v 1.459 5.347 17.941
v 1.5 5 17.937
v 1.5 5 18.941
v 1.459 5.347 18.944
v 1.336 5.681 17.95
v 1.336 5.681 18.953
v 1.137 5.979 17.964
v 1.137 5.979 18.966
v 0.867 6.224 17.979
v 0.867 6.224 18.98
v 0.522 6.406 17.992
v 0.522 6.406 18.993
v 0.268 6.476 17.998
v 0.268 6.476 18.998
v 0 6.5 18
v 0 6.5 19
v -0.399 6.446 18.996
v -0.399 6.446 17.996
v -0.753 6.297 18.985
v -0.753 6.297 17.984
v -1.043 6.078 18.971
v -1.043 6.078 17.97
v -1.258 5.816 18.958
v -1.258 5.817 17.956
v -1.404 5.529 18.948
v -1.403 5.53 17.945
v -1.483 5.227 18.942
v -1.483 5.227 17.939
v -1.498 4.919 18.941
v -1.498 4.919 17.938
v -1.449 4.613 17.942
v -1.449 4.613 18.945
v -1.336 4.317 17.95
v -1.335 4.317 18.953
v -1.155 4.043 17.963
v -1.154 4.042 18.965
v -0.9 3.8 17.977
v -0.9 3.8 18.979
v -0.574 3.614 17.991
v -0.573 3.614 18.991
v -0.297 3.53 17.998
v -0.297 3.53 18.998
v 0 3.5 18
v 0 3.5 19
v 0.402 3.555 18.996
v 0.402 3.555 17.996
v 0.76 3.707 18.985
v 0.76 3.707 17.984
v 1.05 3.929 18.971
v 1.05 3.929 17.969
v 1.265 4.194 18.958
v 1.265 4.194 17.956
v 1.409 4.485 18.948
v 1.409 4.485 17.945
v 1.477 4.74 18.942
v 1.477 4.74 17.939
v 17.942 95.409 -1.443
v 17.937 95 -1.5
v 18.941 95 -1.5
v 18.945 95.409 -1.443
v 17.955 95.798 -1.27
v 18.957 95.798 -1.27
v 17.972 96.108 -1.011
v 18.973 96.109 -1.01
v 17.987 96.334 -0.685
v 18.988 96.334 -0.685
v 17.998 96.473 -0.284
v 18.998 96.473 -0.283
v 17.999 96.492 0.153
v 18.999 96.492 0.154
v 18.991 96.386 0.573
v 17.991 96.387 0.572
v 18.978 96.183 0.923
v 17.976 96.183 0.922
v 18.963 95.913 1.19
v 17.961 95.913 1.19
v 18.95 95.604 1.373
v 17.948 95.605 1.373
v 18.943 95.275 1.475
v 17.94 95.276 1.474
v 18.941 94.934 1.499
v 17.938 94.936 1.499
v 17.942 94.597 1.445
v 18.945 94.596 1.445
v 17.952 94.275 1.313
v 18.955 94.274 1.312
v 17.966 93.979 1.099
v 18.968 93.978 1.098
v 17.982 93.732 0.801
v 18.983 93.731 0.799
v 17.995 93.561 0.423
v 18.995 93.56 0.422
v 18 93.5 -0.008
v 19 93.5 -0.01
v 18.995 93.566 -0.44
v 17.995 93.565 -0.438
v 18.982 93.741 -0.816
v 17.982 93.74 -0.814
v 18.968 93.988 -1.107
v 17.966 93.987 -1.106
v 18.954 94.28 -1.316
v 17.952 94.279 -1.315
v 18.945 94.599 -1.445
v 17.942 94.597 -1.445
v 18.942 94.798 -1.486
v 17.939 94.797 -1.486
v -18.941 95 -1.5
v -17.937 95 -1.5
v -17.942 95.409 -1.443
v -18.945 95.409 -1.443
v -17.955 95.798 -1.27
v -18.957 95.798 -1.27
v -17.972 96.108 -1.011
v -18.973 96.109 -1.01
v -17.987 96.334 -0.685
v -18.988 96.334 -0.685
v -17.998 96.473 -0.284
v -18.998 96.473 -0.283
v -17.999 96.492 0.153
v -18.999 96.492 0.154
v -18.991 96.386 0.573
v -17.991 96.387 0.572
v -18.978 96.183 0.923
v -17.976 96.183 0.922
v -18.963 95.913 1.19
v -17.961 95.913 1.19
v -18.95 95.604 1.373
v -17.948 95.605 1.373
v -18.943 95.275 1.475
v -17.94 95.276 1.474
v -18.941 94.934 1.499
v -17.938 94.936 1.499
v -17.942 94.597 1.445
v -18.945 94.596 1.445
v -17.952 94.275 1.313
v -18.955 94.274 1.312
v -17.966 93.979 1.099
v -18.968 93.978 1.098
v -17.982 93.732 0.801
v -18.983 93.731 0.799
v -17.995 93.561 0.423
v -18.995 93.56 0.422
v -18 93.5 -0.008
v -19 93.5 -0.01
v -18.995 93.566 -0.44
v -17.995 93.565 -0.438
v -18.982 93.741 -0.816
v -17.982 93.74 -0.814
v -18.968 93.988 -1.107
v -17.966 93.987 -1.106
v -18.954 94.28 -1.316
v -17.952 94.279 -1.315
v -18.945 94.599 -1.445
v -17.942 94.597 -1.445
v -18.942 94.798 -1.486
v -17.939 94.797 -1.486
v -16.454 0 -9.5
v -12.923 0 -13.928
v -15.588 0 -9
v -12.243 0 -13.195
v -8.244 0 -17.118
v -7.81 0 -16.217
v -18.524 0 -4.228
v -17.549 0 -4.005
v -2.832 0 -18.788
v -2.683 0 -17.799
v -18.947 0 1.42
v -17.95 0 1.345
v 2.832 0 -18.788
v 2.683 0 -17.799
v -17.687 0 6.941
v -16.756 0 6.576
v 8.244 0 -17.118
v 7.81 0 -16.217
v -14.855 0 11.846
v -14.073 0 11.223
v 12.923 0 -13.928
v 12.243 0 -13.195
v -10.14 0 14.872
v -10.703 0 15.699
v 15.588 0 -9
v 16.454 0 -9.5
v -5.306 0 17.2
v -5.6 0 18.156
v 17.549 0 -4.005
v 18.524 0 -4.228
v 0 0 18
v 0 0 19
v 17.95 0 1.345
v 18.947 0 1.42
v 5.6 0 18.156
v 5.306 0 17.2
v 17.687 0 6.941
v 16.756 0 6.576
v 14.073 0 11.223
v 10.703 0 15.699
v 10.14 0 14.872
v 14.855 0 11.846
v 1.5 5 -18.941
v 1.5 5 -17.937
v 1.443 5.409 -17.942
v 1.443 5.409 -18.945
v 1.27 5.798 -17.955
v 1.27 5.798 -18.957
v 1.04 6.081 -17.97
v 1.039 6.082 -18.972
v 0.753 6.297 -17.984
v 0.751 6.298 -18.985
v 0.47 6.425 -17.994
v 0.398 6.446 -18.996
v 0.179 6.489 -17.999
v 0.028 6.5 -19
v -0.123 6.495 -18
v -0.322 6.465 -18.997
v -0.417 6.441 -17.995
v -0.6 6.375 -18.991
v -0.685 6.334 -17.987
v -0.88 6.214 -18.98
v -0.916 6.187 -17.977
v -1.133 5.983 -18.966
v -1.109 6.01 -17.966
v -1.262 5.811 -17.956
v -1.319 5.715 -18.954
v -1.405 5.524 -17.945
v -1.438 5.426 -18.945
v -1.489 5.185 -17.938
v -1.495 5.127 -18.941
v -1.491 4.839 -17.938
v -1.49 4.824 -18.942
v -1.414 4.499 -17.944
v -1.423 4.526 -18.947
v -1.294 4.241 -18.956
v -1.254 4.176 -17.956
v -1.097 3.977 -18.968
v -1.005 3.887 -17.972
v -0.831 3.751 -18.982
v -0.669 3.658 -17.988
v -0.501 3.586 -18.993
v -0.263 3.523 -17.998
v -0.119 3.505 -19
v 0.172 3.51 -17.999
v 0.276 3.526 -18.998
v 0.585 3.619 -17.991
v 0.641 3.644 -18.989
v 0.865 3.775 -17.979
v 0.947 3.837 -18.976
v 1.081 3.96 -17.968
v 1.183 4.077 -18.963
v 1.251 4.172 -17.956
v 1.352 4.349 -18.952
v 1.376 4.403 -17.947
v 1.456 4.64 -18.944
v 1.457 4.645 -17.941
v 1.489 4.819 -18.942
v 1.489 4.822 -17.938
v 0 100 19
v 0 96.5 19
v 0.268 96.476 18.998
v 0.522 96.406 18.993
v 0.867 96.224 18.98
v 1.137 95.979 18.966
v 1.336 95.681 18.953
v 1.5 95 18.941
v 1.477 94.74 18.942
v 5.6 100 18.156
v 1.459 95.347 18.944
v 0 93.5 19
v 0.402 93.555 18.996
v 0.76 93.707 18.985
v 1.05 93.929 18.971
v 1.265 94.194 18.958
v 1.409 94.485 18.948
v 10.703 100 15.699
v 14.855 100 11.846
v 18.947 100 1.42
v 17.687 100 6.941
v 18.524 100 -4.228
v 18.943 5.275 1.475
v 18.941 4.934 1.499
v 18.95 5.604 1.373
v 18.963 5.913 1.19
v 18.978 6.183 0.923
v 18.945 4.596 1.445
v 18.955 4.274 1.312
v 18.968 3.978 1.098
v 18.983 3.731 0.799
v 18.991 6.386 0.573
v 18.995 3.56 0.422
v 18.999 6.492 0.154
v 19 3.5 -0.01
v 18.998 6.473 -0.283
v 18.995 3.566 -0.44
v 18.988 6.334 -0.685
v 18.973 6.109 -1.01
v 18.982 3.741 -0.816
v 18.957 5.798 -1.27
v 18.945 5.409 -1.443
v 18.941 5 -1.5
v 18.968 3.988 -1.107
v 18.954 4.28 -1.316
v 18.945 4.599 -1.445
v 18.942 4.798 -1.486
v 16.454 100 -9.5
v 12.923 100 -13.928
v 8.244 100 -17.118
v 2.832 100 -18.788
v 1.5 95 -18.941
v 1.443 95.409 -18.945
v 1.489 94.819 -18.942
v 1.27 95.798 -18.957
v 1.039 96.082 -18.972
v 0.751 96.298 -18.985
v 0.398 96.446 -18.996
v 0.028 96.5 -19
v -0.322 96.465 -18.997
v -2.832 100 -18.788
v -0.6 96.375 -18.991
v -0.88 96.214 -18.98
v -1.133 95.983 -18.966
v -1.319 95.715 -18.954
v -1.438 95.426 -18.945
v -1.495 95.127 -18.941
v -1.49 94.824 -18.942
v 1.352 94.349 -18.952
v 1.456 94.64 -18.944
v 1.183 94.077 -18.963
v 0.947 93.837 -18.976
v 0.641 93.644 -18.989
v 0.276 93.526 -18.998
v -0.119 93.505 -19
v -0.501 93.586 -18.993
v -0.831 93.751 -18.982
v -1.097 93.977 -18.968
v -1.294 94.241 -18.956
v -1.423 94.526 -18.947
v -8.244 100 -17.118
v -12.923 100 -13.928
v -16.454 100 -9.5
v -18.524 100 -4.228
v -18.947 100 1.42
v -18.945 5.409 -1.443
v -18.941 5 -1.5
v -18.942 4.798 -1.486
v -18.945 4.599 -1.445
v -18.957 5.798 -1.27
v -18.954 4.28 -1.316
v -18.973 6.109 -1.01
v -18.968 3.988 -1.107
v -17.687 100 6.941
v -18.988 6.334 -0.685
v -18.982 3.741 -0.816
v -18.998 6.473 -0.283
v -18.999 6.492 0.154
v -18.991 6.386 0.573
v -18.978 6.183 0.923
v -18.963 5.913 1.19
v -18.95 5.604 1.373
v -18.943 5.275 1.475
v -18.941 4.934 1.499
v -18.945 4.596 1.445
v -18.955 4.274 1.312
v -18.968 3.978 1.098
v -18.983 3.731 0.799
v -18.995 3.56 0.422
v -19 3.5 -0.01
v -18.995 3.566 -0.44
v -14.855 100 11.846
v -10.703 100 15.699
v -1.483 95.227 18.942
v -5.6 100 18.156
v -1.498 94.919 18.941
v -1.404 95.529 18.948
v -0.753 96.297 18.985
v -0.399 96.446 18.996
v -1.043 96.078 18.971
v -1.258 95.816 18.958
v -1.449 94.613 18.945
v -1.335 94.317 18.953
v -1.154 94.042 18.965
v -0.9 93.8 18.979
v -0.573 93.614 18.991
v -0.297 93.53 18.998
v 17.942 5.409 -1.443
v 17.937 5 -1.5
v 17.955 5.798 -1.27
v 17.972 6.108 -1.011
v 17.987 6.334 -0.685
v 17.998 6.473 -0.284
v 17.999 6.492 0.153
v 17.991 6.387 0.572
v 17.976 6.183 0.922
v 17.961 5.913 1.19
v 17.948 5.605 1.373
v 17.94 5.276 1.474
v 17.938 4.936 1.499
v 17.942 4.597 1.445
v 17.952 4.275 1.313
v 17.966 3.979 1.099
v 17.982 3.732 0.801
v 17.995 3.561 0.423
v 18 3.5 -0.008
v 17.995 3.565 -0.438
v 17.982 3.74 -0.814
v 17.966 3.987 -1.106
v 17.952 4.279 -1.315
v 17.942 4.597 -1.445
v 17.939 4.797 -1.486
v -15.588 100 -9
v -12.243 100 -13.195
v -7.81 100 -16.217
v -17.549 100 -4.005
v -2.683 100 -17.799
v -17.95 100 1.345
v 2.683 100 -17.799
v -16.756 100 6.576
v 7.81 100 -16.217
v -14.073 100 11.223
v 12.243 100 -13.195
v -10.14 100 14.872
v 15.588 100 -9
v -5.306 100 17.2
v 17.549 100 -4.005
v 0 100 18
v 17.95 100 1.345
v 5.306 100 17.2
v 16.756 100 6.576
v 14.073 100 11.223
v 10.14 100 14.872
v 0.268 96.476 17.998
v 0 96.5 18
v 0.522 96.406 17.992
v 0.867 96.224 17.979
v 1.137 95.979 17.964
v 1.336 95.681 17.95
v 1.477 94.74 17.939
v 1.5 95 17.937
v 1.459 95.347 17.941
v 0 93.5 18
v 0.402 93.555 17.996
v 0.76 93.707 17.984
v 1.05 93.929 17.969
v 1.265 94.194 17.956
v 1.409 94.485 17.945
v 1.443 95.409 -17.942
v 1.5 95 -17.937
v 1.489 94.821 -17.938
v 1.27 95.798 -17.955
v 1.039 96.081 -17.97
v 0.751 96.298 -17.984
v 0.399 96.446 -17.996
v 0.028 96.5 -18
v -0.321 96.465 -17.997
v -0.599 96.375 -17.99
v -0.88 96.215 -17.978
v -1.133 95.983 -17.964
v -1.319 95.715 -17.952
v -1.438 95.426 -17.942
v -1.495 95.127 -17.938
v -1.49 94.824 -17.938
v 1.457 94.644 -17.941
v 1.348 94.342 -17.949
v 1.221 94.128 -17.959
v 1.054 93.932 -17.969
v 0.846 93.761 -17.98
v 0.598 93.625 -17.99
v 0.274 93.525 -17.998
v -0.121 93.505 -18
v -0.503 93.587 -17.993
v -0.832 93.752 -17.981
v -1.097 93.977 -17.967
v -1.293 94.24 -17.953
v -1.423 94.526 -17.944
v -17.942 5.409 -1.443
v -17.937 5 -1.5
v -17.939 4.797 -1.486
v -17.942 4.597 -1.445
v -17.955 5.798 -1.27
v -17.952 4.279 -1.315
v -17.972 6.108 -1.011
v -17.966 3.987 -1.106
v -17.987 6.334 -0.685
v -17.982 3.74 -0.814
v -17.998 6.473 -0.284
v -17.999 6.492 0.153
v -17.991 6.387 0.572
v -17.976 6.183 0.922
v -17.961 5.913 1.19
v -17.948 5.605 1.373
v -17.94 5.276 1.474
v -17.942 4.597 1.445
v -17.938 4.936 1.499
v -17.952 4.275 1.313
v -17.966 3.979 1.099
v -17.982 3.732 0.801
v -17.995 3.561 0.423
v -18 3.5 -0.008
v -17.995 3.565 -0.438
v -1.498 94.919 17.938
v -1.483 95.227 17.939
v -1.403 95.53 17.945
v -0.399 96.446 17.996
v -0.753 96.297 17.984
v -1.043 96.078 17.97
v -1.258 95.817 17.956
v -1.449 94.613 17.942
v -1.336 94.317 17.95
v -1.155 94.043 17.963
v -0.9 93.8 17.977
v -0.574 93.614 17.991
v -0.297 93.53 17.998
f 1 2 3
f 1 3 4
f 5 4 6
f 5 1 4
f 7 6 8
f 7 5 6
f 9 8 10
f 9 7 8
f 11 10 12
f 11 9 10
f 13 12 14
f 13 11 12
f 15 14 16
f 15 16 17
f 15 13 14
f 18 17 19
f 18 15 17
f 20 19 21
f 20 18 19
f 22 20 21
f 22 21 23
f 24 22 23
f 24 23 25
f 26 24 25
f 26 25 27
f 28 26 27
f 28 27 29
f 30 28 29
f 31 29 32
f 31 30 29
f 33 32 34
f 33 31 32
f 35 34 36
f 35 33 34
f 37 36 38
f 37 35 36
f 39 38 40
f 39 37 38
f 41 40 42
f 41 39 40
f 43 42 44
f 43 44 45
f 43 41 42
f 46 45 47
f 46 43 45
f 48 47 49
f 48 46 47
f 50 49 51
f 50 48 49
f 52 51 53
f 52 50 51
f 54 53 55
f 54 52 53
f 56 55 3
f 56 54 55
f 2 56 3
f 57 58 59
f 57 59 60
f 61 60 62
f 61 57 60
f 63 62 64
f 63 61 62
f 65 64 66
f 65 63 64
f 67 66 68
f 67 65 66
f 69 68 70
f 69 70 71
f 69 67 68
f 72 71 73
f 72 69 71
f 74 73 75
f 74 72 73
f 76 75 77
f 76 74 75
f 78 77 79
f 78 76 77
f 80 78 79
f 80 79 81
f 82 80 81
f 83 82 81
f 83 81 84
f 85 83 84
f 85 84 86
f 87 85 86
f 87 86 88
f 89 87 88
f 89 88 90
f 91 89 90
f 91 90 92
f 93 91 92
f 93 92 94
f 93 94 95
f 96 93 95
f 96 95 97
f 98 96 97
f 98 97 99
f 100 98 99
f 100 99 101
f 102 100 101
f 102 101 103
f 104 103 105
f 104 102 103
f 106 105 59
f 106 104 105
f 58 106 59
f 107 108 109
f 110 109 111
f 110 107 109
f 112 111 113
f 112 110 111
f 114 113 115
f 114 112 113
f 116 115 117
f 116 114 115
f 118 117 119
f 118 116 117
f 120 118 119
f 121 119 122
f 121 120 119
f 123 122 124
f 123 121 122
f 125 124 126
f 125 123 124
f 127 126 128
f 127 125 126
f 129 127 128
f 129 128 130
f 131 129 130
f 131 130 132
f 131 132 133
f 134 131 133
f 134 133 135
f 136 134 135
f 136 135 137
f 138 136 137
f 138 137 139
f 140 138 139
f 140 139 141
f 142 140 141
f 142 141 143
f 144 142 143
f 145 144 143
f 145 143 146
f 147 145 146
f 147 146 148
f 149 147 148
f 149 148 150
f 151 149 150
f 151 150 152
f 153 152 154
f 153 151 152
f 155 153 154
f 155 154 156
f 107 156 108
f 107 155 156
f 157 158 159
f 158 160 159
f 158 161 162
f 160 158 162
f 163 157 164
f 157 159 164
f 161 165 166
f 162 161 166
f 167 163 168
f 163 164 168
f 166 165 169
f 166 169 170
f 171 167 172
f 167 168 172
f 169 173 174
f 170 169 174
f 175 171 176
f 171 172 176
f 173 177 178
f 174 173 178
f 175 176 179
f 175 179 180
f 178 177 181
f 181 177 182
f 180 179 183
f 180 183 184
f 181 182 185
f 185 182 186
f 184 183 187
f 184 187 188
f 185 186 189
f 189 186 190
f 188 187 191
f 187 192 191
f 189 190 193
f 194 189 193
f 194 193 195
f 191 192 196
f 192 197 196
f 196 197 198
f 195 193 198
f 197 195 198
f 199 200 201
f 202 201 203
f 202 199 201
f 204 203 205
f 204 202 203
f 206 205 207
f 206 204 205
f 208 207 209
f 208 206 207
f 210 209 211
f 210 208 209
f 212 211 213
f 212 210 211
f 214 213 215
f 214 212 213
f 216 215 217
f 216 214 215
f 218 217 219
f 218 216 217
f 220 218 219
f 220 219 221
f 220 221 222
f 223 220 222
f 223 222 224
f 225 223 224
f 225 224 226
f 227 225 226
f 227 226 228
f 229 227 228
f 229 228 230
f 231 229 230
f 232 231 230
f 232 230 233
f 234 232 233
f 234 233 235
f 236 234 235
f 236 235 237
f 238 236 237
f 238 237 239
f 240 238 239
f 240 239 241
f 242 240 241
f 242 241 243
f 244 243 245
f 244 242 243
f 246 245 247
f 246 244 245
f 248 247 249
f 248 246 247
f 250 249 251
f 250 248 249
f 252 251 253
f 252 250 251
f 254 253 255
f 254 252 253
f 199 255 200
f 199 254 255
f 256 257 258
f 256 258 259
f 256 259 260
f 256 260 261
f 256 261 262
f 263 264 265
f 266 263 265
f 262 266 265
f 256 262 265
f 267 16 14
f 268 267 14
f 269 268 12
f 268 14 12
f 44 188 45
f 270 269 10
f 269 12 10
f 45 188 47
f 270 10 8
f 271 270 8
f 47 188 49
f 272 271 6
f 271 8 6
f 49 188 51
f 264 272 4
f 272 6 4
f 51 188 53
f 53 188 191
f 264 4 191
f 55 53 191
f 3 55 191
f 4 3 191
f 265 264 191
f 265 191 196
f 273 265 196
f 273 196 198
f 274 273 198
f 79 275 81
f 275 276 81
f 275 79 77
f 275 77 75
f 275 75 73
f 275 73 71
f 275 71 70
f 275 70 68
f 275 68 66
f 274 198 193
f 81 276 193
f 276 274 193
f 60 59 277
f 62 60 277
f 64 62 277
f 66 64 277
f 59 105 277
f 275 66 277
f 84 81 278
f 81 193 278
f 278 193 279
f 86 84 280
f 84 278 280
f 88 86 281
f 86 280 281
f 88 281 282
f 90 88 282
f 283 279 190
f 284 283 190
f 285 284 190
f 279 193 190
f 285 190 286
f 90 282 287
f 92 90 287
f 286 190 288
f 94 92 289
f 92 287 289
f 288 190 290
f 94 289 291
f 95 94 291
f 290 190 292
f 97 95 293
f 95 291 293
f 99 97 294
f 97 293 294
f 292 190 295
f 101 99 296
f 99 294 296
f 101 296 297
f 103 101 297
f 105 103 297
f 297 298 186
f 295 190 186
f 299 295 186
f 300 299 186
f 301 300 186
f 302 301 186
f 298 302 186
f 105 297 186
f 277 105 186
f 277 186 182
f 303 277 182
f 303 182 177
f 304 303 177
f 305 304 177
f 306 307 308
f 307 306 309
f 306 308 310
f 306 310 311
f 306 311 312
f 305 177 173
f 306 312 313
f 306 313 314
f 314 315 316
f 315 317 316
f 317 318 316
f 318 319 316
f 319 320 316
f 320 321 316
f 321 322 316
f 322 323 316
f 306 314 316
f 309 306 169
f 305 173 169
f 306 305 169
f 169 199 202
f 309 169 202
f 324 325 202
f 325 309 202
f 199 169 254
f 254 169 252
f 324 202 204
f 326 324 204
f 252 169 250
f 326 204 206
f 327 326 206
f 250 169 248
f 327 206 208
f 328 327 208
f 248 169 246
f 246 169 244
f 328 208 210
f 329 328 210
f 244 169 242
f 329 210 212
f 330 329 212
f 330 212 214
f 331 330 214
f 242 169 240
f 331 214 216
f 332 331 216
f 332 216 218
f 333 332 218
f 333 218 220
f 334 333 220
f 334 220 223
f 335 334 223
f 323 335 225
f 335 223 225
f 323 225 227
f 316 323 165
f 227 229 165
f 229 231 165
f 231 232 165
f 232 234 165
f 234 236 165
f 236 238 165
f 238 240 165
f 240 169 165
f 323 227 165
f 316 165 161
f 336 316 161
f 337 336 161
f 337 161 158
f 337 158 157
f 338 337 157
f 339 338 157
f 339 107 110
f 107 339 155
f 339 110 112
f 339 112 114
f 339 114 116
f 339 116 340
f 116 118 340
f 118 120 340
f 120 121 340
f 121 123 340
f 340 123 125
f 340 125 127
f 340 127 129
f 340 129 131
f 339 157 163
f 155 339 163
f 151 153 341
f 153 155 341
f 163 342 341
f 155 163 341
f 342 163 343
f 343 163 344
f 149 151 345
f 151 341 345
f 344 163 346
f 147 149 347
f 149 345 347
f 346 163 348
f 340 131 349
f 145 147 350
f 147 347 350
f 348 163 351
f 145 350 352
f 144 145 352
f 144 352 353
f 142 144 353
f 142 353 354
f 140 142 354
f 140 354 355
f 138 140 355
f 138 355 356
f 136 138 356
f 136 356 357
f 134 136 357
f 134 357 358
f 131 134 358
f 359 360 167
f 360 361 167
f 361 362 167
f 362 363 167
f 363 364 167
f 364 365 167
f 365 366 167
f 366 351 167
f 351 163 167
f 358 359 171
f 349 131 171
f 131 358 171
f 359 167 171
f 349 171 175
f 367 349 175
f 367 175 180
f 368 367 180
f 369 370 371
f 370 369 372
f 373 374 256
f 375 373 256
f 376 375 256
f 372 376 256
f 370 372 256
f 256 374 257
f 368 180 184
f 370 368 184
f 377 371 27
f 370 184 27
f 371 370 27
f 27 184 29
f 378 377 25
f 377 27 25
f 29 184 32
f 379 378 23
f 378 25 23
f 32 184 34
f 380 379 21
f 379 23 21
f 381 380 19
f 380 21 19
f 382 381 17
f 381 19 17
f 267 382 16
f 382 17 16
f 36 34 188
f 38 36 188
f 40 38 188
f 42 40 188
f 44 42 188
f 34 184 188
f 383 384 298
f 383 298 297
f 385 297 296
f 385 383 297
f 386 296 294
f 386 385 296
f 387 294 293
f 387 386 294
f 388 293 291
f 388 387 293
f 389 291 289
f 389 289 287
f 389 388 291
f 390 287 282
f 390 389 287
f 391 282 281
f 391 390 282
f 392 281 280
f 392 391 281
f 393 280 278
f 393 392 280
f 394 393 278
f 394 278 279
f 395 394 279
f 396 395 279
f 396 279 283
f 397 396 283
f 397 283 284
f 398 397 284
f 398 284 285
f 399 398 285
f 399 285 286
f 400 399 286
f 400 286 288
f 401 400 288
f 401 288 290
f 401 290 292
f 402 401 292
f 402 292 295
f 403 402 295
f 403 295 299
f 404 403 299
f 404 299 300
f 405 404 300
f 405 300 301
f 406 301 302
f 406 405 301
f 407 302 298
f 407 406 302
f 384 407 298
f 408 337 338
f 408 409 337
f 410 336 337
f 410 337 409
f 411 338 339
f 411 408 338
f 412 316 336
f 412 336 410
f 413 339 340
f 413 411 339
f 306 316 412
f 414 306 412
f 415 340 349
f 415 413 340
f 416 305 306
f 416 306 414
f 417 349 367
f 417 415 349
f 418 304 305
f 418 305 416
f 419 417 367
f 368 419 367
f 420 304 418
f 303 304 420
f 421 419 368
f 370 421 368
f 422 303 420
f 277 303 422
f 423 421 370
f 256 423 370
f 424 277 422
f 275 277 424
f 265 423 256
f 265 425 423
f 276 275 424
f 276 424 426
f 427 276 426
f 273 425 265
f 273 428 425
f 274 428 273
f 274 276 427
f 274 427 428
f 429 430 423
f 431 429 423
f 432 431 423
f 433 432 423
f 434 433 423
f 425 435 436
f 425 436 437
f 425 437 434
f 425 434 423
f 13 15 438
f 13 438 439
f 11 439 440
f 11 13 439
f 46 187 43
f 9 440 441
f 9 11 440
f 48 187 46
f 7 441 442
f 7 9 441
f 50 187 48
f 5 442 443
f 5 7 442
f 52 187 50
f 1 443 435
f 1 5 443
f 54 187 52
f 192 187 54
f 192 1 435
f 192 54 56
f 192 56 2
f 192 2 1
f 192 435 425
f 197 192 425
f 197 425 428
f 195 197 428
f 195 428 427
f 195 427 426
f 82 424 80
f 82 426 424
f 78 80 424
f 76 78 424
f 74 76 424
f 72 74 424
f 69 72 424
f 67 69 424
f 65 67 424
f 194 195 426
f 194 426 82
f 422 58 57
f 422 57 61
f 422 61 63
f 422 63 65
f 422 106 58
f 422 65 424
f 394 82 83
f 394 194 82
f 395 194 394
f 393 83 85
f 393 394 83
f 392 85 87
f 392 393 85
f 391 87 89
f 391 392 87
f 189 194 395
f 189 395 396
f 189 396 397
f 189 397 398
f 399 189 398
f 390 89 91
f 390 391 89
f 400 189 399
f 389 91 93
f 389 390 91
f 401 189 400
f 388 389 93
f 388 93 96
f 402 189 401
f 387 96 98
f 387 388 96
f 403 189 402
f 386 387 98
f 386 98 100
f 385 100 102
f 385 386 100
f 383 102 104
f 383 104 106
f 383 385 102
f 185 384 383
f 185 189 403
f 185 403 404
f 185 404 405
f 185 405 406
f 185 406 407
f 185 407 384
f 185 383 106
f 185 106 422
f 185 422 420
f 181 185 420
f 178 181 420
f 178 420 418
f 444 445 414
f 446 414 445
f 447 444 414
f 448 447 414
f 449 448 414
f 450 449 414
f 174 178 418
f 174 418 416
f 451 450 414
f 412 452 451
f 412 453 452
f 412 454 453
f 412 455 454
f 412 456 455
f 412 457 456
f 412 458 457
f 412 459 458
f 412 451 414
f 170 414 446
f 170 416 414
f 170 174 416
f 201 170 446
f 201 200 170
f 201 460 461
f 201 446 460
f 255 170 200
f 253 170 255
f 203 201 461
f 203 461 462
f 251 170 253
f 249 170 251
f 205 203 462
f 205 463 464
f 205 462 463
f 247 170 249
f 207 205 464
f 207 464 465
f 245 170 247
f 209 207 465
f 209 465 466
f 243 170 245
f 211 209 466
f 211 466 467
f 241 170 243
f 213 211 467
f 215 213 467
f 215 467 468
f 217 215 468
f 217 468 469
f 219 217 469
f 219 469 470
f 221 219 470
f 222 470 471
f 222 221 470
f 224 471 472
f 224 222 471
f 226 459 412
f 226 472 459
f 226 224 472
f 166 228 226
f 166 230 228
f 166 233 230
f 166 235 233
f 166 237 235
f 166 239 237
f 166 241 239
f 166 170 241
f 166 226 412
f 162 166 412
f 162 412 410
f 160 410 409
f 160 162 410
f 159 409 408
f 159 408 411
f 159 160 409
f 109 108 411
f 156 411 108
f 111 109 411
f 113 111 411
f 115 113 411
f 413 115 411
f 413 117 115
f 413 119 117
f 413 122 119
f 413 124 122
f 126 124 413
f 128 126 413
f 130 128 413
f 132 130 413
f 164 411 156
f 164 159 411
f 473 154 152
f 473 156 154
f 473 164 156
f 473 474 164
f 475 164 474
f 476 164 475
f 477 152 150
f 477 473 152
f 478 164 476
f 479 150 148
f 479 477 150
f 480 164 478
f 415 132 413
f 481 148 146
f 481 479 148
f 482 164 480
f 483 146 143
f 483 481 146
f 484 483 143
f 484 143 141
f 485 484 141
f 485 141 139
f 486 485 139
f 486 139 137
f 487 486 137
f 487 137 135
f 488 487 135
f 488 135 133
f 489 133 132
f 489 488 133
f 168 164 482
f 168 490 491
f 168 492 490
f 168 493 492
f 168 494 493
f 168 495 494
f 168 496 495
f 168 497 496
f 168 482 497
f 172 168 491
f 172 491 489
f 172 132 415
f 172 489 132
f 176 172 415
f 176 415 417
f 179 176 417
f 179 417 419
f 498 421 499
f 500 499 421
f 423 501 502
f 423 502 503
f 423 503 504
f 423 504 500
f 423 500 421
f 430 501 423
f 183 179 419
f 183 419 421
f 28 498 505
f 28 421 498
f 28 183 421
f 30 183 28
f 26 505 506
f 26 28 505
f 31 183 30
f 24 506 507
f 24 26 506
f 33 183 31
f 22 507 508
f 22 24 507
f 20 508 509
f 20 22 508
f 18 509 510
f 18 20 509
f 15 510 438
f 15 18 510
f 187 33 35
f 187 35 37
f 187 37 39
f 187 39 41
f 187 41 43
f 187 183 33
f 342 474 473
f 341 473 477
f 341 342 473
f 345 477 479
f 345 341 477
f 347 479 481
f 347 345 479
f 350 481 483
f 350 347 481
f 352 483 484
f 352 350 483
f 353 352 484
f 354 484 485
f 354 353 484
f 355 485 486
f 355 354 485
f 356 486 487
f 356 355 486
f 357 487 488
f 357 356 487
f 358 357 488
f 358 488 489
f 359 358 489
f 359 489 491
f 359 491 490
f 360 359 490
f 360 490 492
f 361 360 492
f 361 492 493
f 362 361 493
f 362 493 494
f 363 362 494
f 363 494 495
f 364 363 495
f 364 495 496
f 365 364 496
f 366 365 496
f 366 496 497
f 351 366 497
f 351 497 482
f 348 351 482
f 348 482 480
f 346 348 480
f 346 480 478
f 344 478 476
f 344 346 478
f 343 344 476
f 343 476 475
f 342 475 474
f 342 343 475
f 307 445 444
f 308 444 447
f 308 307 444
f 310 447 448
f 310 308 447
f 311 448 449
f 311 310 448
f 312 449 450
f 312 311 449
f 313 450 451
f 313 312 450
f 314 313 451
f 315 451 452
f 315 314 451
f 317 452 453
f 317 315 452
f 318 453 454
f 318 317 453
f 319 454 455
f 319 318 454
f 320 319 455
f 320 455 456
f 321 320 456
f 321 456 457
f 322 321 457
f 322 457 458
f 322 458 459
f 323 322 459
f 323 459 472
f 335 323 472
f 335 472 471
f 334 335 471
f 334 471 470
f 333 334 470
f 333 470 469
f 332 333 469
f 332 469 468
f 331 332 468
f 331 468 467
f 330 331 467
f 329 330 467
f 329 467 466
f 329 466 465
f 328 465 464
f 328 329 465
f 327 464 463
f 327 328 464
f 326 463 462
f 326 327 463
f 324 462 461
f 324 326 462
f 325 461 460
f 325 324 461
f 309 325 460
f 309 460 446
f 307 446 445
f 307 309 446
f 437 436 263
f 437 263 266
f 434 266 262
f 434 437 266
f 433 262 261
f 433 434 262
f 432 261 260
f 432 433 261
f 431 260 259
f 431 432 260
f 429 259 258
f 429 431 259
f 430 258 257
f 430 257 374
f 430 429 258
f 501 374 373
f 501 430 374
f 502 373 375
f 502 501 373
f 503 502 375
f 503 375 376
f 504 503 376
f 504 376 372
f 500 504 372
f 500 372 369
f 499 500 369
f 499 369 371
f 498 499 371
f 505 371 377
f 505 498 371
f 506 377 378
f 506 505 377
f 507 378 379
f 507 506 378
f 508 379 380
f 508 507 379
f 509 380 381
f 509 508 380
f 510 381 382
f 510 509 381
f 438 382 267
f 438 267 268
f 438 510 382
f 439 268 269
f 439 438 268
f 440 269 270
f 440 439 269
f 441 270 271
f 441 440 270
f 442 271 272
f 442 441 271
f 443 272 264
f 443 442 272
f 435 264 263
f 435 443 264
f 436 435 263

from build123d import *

# Parameters (mm, degrees)
SKETCH1_R               = 19
SKETCH1_R_2             = 18
BOSS_EXTRUDE1_DEPTH     = 100
CUT_EXTRUDE1_DEPTH      = 104.547090737
CUT_EXTRUDE1_DEPTH_BACK = 104.547090737
SKETCH2_R               = 1.5
CUT_EXTRUDE2_DEPTH      = 104.54709087
CUT_EXTRUDE2_DEPTH_BACK = 104.54709087
SKETCH3_R               = 1.5


with BuildPart() as part:
    # Sketch1 → Boss-Extrude1 (new body)
    with BuildSketch(Plane(origin=(0, 0, 0), x_dir=(1, 0, 0), z_dir=(0, 1, 0))):
        with Locations(Location((0, 0, 0), (0, 0, 270))):
            Circle(SKETCH1_R)
        with Locations(Location((0, 0, 0), (0, 0, 270))):
            Circle(SKETCH1_R_2, mode=Mode.SUBTRACT)
    extrude(amount=BOSS_EXTRUDE1_DEPTH)

    # Sketch2 → Cut-Extrude1 (cut, two sides: drawn at the far end of the back side and taken through both)
    with BuildSketch(Plane.XY.offset(-CUT_EXTRUDE1_DEPTH_BACK)):
        with Locations((0, 95)):
            Circle(SKETCH2_R)
        with Locations((0, 5)):
            Circle(SKETCH2_R)
    extrude(amount=CUT_EXTRUDE1_DEPTH + CUT_EXTRUDE1_DEPTH_BACK, mode=Mode.SUBTRACT)

    # Sketch3 → Cut-Extrude2 (cut, two sides: drawn at the far end of the back side and taken through both)
    with BuildSketch(Plane(origin=(0, 0, 0), x_dir=(0, 0, -1), z_dir=(1, 0, 0)).offset(-CUT_EXTRUDE2_DEPTH_BACK)):
        with Locations((0, 5)):
            Circle(SKETCH3_R)
        with Locations((0, 95)):
            Circle(SKETCH3_R)
    extrude(amount=CUT_EXTRUDE2_DEPTH + CUT_EXTRUDE2_DEPTH_BACK, mode=Mode.SUBTRACT)


solid = part.part
